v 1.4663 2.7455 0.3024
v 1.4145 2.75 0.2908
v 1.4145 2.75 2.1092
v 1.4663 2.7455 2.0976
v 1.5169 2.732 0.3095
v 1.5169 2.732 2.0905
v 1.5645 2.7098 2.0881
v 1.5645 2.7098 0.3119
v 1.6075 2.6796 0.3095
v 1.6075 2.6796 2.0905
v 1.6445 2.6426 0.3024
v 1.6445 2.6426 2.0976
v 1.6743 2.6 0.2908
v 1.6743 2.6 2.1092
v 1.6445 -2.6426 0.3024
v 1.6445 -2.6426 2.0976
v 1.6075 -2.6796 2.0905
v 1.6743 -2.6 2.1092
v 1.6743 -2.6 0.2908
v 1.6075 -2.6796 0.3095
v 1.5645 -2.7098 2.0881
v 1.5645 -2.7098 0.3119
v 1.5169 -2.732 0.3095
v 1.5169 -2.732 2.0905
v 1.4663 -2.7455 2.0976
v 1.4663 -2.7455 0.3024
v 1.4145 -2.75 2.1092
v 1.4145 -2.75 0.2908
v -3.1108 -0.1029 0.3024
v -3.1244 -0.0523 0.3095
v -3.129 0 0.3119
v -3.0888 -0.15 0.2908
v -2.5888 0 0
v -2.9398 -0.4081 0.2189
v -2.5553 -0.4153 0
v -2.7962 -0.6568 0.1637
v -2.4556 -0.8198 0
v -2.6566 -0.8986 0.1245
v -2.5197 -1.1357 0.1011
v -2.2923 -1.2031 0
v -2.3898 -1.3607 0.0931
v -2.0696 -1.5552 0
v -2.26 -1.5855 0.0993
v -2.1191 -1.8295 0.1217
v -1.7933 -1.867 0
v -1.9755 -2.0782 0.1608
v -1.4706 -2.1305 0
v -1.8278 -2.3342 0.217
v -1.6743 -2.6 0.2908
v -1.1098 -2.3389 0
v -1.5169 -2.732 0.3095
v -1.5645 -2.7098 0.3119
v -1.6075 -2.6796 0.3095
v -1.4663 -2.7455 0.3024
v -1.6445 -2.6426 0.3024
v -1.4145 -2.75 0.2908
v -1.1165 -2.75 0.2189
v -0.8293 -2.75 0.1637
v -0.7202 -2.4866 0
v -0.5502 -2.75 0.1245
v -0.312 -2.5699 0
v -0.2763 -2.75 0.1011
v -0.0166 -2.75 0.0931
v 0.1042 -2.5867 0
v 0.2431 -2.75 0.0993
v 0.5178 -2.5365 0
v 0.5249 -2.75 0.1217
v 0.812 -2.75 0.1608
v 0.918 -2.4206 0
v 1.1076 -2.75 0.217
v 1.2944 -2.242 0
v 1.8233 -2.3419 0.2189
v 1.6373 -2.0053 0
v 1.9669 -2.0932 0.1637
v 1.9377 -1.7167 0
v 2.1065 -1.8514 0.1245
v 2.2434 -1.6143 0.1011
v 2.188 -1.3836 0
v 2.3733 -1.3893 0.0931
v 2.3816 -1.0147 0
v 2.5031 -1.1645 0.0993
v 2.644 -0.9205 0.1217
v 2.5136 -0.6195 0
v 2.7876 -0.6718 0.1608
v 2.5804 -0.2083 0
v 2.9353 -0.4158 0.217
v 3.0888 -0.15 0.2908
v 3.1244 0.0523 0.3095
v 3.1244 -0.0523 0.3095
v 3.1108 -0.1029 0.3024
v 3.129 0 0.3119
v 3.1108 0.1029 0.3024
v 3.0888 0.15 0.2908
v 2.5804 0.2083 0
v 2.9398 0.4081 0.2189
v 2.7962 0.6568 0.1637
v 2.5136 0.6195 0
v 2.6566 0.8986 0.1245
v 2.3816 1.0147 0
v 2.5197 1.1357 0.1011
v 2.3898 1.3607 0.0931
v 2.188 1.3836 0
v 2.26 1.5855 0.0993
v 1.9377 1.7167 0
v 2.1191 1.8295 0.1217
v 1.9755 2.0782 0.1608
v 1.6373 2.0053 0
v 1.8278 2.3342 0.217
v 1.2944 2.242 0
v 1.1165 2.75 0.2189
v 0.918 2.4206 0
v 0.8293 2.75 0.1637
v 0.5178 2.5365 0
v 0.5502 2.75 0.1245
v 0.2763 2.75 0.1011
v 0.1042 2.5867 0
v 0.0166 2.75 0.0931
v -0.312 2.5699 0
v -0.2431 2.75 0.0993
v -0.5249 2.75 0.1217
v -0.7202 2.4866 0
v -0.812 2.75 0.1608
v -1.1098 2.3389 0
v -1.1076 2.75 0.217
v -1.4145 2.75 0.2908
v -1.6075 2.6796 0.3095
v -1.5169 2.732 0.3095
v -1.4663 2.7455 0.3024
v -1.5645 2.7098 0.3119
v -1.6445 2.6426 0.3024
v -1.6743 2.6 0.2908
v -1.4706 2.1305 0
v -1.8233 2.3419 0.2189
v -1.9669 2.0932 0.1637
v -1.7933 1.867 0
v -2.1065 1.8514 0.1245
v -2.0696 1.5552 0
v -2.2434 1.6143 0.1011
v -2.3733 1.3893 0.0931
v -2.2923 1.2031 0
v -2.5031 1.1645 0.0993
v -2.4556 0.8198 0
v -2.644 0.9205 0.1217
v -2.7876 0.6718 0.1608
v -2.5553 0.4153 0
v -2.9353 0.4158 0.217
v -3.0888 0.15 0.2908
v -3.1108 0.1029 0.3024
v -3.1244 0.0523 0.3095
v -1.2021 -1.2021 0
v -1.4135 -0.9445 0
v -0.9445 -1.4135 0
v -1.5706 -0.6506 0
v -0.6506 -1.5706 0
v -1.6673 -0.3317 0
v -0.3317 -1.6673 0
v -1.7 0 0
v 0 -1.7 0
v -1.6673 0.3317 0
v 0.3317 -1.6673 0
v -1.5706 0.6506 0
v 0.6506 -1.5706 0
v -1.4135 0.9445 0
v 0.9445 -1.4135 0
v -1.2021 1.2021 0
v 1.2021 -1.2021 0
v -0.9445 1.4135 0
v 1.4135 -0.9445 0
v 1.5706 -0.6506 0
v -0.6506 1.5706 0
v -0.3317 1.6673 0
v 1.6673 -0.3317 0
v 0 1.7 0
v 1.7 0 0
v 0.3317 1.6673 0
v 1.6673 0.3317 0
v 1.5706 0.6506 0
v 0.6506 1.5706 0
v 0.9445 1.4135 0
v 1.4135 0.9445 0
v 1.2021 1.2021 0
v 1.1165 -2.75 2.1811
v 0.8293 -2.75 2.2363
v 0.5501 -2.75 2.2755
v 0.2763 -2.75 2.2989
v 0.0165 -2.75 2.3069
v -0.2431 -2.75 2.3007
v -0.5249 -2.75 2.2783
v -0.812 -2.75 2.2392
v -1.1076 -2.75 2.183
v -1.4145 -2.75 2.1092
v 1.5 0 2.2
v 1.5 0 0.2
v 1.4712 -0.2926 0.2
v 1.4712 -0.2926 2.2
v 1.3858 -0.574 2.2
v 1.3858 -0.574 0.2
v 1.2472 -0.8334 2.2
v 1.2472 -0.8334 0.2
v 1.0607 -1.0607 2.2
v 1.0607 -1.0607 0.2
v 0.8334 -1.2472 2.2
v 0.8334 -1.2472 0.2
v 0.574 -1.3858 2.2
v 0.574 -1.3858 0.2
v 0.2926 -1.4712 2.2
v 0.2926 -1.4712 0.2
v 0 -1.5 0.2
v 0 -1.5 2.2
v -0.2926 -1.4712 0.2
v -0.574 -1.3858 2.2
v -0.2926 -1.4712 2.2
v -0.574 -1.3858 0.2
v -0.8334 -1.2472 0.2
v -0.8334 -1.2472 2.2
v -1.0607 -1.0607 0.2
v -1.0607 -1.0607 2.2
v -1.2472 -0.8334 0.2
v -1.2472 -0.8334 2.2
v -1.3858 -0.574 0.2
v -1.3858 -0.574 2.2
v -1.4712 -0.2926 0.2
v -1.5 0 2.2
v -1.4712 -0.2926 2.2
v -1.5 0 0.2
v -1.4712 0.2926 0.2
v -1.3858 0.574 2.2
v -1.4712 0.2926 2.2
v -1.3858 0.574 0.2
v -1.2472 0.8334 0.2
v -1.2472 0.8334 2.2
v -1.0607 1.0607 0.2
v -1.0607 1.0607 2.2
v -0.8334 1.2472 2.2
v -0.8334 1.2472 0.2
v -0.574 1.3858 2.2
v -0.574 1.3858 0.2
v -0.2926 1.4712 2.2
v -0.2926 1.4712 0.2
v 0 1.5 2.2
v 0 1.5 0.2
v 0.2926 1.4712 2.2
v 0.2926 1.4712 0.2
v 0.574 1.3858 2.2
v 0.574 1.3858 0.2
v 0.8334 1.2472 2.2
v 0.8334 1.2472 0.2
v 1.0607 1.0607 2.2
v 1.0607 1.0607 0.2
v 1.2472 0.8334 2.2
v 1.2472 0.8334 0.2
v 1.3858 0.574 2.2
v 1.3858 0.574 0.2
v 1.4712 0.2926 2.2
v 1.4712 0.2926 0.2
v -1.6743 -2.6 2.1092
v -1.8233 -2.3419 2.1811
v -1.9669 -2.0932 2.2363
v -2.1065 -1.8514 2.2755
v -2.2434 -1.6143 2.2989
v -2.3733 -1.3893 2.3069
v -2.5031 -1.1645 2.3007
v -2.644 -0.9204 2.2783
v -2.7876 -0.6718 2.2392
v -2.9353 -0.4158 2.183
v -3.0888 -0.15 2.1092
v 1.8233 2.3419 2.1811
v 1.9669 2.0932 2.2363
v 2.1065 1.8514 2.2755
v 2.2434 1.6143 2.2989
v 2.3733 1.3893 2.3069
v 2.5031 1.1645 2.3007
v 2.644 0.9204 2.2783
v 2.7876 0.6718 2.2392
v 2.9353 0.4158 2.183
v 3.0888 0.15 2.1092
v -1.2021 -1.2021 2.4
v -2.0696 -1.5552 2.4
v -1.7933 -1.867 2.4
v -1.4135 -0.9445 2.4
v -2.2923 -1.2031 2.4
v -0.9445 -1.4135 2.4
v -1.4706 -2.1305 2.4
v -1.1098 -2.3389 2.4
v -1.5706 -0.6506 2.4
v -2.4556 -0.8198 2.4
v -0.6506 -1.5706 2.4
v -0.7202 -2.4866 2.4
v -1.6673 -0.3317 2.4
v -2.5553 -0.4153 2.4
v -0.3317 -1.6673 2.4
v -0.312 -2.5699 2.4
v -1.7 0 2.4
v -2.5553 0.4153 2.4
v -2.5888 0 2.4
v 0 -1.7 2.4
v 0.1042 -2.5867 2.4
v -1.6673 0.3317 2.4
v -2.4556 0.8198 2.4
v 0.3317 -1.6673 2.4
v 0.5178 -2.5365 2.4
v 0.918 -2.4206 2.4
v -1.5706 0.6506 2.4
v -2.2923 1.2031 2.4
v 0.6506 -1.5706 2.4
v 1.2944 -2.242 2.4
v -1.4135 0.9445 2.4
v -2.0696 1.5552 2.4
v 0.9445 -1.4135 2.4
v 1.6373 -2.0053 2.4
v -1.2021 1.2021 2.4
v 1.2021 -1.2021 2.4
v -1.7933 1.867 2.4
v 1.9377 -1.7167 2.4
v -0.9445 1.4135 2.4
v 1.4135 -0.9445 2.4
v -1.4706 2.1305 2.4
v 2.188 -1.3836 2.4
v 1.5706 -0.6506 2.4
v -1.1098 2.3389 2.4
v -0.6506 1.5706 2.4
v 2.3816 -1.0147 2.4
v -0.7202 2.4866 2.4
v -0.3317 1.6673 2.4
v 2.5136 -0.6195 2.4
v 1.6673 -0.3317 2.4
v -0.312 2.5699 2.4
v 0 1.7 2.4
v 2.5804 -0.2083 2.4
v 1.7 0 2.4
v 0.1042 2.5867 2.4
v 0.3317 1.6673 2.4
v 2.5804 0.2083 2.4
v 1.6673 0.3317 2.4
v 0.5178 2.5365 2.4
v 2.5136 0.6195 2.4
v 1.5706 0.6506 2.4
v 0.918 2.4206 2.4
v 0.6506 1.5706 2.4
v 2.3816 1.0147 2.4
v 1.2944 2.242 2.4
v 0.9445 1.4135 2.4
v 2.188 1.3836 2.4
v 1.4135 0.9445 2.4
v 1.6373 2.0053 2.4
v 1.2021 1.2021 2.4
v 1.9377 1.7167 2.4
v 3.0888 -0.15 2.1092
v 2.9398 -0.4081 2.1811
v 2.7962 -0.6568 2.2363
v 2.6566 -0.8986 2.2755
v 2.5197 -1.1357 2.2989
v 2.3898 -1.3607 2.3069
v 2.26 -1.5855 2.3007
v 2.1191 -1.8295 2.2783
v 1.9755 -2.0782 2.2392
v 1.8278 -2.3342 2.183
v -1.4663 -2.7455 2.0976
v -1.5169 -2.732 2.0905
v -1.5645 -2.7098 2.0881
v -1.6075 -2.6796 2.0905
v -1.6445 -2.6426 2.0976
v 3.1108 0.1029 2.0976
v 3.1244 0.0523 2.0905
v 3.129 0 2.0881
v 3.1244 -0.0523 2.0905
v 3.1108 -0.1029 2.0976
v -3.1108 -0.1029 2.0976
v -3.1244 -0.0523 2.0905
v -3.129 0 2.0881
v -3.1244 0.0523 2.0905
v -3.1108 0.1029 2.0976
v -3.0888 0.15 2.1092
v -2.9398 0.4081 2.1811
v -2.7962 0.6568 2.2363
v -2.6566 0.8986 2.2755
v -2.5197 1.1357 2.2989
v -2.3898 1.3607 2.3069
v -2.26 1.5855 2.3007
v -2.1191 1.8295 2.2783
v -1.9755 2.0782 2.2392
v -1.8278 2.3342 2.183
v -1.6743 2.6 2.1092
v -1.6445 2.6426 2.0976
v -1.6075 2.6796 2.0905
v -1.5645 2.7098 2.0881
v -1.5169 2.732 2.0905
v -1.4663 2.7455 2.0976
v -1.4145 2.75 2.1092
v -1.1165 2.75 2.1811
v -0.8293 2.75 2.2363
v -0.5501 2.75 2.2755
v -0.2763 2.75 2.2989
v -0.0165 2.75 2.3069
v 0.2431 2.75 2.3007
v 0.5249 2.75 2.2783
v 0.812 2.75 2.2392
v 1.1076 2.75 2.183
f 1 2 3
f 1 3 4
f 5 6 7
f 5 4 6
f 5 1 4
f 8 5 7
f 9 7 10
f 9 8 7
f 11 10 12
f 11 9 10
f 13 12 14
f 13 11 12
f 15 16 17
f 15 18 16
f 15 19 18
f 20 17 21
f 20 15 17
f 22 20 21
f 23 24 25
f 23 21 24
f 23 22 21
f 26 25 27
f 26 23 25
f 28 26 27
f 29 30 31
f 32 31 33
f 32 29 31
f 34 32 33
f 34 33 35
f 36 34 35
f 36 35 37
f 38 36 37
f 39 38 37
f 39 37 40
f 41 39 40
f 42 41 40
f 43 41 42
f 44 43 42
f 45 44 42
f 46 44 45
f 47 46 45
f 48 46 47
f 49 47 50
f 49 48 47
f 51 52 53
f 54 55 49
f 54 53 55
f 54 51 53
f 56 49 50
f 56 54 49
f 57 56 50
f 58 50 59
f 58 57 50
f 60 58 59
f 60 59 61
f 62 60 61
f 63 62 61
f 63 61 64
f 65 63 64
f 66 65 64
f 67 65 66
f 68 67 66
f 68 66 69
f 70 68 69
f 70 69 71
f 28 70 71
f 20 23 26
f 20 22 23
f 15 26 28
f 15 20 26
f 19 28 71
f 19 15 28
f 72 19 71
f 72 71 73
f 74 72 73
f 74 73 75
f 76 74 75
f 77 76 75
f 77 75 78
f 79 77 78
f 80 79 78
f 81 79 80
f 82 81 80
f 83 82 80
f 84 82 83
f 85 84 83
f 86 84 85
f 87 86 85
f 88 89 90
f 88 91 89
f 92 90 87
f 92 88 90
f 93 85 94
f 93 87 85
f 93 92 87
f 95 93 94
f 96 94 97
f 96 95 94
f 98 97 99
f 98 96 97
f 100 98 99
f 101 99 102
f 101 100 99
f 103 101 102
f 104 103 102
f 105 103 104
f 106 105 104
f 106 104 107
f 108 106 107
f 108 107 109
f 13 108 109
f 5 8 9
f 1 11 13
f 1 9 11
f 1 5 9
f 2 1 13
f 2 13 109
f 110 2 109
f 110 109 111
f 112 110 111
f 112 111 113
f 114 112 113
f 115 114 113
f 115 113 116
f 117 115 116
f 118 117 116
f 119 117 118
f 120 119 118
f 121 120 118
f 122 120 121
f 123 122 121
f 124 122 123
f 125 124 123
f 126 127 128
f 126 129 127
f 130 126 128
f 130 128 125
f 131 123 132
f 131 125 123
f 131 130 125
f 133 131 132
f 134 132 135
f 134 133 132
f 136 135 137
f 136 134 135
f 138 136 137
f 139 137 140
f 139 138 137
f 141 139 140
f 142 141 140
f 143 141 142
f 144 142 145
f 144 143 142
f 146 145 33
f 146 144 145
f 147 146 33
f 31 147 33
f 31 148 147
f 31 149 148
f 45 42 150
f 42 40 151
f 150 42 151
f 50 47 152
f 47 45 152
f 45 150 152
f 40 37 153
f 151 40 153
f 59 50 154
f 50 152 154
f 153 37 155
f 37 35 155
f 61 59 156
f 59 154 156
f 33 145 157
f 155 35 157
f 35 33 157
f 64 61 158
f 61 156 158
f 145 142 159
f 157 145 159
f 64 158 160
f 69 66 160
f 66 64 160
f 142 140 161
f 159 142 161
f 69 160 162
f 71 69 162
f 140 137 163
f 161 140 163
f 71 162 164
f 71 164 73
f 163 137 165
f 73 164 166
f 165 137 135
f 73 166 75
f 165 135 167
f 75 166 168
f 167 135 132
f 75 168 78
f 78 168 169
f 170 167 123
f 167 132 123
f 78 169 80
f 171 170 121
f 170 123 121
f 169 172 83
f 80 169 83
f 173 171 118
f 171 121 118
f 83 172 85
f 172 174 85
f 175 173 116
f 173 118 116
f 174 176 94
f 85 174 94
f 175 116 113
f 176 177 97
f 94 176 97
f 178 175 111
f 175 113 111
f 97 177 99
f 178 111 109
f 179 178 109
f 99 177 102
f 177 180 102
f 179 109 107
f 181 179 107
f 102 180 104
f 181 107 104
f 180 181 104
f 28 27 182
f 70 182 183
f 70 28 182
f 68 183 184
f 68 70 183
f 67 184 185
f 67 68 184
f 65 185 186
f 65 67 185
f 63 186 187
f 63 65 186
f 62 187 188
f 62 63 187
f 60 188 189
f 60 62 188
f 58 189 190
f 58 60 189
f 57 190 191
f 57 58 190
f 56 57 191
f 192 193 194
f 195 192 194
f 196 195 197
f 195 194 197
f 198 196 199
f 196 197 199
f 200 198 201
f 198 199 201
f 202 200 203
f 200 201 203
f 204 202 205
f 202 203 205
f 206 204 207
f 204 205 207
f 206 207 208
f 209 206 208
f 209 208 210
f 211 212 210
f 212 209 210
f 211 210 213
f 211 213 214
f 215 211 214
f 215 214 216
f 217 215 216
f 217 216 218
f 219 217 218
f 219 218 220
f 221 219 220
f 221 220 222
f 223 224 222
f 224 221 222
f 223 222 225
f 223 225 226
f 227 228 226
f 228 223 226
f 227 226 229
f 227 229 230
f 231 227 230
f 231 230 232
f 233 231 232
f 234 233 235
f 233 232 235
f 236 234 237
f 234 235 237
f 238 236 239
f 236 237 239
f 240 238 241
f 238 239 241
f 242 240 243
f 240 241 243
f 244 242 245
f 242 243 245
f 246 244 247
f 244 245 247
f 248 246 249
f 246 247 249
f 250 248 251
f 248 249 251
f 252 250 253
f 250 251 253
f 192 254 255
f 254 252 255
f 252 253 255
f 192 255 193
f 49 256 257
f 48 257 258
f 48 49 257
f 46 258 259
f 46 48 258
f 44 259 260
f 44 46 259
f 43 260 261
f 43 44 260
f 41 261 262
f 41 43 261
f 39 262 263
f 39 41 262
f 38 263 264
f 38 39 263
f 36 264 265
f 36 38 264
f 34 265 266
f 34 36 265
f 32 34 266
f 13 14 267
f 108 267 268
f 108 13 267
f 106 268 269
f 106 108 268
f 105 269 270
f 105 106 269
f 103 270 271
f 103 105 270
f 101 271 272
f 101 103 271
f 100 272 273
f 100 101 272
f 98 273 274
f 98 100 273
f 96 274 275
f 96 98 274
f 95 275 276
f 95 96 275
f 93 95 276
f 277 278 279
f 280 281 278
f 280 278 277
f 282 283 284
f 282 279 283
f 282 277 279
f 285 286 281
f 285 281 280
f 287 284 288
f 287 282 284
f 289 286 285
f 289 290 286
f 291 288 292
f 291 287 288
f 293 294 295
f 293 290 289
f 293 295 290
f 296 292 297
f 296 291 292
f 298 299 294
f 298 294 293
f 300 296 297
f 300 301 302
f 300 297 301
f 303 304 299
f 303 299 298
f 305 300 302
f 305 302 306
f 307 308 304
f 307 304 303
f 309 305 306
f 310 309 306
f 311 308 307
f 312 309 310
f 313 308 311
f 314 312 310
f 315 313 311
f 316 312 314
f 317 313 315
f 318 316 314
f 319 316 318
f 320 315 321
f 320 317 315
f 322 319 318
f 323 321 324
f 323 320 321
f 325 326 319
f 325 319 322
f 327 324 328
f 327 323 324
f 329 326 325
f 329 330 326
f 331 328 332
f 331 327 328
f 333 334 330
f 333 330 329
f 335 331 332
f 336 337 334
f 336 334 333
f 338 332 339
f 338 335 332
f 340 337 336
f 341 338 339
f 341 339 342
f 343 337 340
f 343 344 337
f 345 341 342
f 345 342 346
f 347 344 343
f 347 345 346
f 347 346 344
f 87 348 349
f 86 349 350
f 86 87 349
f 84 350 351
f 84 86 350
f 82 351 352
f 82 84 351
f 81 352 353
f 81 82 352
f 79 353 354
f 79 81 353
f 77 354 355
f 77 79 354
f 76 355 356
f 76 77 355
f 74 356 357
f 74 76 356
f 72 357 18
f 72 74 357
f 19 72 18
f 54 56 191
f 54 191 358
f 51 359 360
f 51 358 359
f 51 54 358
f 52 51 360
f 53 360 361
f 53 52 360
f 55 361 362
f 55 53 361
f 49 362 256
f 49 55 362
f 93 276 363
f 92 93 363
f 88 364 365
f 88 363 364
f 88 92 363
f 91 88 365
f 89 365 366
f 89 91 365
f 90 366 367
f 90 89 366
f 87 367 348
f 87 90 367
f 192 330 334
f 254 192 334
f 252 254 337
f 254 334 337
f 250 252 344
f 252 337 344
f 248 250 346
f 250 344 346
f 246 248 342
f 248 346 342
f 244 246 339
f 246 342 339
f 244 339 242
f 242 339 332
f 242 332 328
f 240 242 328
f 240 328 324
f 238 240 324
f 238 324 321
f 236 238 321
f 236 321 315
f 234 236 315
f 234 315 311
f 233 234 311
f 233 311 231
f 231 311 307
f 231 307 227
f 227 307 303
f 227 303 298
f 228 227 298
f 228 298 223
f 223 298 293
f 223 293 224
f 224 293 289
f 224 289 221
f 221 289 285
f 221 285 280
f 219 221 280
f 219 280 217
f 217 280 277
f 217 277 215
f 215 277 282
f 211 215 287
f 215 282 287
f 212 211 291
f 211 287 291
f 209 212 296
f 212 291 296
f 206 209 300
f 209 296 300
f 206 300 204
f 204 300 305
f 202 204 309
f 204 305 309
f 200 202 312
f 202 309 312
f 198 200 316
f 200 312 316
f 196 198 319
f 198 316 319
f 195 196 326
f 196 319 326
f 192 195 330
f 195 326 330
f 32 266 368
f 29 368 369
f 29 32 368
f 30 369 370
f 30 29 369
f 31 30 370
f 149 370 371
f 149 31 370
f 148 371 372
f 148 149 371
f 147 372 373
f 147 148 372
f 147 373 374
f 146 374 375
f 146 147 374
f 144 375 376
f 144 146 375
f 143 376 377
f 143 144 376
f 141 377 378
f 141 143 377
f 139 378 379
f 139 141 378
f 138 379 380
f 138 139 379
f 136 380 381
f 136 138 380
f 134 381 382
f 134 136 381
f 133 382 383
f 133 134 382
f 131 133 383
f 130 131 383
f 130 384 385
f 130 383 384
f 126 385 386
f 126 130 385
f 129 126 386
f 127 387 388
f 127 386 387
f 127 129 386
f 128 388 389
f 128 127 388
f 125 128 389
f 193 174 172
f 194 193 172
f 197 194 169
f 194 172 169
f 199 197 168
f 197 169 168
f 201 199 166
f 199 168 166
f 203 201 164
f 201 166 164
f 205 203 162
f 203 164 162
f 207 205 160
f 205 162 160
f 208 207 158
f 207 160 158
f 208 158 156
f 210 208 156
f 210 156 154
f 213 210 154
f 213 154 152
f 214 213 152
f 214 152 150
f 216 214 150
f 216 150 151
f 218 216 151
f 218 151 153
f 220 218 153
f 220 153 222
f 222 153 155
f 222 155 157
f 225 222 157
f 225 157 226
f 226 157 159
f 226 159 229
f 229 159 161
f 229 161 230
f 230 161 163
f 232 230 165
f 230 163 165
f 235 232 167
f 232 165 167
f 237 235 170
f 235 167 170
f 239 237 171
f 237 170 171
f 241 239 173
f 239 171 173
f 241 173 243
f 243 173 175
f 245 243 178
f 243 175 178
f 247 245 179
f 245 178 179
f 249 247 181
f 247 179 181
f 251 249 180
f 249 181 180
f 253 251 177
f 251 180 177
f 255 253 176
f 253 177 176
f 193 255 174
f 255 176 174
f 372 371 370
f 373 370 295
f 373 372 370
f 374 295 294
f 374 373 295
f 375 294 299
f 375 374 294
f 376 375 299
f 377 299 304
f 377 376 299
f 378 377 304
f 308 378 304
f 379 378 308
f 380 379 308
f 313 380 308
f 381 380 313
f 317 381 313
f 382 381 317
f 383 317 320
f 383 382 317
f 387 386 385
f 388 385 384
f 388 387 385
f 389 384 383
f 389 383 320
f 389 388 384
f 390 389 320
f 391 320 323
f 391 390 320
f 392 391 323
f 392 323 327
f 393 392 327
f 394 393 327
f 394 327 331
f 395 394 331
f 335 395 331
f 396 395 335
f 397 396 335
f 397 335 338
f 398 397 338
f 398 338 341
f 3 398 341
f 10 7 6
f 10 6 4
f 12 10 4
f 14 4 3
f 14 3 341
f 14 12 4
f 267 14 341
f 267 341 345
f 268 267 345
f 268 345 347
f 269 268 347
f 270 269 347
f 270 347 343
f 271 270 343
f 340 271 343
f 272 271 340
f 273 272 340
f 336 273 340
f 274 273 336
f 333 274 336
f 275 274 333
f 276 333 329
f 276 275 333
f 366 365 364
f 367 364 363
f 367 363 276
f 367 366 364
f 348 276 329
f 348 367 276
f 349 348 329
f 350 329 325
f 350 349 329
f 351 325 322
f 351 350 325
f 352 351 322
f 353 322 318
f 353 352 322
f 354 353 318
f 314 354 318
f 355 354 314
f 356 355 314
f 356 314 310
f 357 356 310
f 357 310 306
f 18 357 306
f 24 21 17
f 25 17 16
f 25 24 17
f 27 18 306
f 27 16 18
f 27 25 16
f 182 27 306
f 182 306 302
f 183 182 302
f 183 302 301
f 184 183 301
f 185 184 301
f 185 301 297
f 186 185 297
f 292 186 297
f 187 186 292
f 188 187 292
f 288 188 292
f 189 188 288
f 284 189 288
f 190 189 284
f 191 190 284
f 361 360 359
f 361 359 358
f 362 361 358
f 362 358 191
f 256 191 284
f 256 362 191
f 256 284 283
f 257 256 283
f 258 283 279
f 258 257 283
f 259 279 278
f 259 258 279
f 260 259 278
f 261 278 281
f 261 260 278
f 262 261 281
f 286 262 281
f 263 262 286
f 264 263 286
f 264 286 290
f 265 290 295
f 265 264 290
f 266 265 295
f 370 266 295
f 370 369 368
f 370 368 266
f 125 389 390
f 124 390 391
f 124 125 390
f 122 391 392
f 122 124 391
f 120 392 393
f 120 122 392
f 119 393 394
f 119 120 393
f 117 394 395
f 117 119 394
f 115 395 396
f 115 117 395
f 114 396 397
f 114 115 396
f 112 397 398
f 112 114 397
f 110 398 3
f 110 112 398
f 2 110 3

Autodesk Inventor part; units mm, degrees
ref_plane "YZ Plane" through (0, 0, 0) normal (1, 0, 0) x (0, 1, 0)
ref_plane "XZ Plane" through (0, 0, 0) normal (0, 1, 0) x (-1, 0, 0)
ref_plane "XY Plane" through (0, 0, 0) normal (0, 0, 1) x (1, 0, 0)
sketch "Sketch17" plane through (0, 0, 0) normal (0, 0, 1) x (1, 0, 0)
  line L0 (-3.0888, 0.15) -> (-1.6743, 2.6)
  line L1 (-1.4145, 2.75) -> (1.4145, 2.75)
  line L2 (1.6743, 2.6) -> (3.0888, 0.15)
  line L3 (3.0888, -0.15) -> (1.6743, -2.6)
  line L4 (1.4145, -2.75) -> (-1.4145, -2.75)
  line L5 (-1.6743, -2.6) -> (-3.0888, -0.15)
  circle A0 centre (0, 0) radius 1.5
  arc A1 (-1.4145, 2.75) -> (-1.6743, 2.6) centre (-1.4145, 2.45) ccw
  arc A2 (1.6743, 2.6) -> (1.4145, 2.75) centre (1.4145, 2.45) ccw
  arc A3 (3.0888, -0.15) -> (3.0888, 0.15) centre (2.829, 0) ccw
  arc A4 (1.4145, -2.75) -> (1.6743, -2.6) centre (1.4145, -2.45) ccw
  arc A5 (-1.6743, -2.6) -> (-1.4145, -2.75) centre (-1.4145, -2.45) ccw
  arc A6 (-3.0888, 0.15) -> (-3.0888, -0.15) centre (-2.829, 0) ccw
  point P0 (-3.1754, 0)
  point P1 (-1.5877, 2.75)
  point P2 (1.5877, 2.75)
  point P3 (3.1754, 0)
  point P4 (1.5877, -2.75)
  point P5 (-1.5877, -2.75)
  dimension "d103" = 5.5
  dimension "d104" = 3
  dimension "d105" = 0.3
extrude "Extrusion14" add sketch "Sketch17" along normal blind 2.4
sketch "Sketch18" plane through (0, 0, 0) normal (0, 1, 0) x (-1, 0, 0)
  line L0 (-3.0888, 2.4) -> (-1.6743, 2.4) projected
  line L1 (-1.6743, 0) -> (-1.6743, 2.4) projected
  line L2 (-3.0888, 0) -> (-1.6743, 0) projected
  line L3 (-3.0888, 0) -> (-3.0888, 2.4) projected
  line L4 (-1.5, 2.4) -> (1.5, 2.4) projected
  line L5 (1.5, 0) -> (-1.5, 0) projected
  line L6 (1.6743, 2.4) -> (3.0888, 2.4) projected
  line L7 (3.0888, 0) -> (3.0888, 2.4) projected
  line L8 (1.6743, 0) -> (3.0888, 0) projected
  line L9 (1.6743, 0) -> (1.6743, 2.4) projected
  line L10 (0, 2.4) -> (0, 4.8692)
  line L11 (0, 4.8692) -> (0, -2.1161)
  line L12 (1.4145, 0) -> (1.6743, 0) projected
  line L13 (1.4145, 2.4) -> (1.6743, 2.4) projected
  line L14 (1.6743, 0) -> (1.6743, 2.4) projected
  line L15 (1.4145, 0) -> (1.6743, 0) projected
  line L16 (1.4145, 0) -> (1.4145, 2.4) projected
  line L17 (2.5888, 3.8507) -> (2.5888, -1.604) construction
  line L18 (4.0837, 1.5369) -> (4.0837, 3.518)
  line L19 (4.0837, 3.518) -> (2.5888, 3.518)
  line L20 (2.5888, 2.4) -> (2.5888, 3.518)
  line L21 (2.5888, 0) -> (4.2933, 0.9841)
  line L22 (4.2933, 0.9841) -> (4.2933, -0.6301)
  line L23 (4.2933, -0.6301) -> (2.5888, -0.6301)
  line L24 (2.5888, -0.6301) -> (2.5888, 0)
  line L25 (2.5888, 2.4) -> (4.0837, 1.5369)
  dimension "d110" = 30
  dimension "d111" = 30
  dimension "d115" = 0.5
revolve "Revolution1" cut sketch "Sketch18" angle 360 about axis through (0, 0, 4.8692) along (0, 0, -1) contours L20 L19 L18 L25 L7 L6 | L6 L7 L25 | L21 L7 L8 | L8 L7 L21 L22 L23 L24
thread "Thread3" size "M3x0.5" class "6H" standard "ANSI Metric M Profile" full length
chamfer "Chaflán9" distance 0.2 angle 45 1 edges at (-1.5, 0, 2.4)
chamfer "Chaflán10" distance 0.2 angle 45 1 edges at (-1.5, 0, 0)
properties part number "CF-TCA-0001"
